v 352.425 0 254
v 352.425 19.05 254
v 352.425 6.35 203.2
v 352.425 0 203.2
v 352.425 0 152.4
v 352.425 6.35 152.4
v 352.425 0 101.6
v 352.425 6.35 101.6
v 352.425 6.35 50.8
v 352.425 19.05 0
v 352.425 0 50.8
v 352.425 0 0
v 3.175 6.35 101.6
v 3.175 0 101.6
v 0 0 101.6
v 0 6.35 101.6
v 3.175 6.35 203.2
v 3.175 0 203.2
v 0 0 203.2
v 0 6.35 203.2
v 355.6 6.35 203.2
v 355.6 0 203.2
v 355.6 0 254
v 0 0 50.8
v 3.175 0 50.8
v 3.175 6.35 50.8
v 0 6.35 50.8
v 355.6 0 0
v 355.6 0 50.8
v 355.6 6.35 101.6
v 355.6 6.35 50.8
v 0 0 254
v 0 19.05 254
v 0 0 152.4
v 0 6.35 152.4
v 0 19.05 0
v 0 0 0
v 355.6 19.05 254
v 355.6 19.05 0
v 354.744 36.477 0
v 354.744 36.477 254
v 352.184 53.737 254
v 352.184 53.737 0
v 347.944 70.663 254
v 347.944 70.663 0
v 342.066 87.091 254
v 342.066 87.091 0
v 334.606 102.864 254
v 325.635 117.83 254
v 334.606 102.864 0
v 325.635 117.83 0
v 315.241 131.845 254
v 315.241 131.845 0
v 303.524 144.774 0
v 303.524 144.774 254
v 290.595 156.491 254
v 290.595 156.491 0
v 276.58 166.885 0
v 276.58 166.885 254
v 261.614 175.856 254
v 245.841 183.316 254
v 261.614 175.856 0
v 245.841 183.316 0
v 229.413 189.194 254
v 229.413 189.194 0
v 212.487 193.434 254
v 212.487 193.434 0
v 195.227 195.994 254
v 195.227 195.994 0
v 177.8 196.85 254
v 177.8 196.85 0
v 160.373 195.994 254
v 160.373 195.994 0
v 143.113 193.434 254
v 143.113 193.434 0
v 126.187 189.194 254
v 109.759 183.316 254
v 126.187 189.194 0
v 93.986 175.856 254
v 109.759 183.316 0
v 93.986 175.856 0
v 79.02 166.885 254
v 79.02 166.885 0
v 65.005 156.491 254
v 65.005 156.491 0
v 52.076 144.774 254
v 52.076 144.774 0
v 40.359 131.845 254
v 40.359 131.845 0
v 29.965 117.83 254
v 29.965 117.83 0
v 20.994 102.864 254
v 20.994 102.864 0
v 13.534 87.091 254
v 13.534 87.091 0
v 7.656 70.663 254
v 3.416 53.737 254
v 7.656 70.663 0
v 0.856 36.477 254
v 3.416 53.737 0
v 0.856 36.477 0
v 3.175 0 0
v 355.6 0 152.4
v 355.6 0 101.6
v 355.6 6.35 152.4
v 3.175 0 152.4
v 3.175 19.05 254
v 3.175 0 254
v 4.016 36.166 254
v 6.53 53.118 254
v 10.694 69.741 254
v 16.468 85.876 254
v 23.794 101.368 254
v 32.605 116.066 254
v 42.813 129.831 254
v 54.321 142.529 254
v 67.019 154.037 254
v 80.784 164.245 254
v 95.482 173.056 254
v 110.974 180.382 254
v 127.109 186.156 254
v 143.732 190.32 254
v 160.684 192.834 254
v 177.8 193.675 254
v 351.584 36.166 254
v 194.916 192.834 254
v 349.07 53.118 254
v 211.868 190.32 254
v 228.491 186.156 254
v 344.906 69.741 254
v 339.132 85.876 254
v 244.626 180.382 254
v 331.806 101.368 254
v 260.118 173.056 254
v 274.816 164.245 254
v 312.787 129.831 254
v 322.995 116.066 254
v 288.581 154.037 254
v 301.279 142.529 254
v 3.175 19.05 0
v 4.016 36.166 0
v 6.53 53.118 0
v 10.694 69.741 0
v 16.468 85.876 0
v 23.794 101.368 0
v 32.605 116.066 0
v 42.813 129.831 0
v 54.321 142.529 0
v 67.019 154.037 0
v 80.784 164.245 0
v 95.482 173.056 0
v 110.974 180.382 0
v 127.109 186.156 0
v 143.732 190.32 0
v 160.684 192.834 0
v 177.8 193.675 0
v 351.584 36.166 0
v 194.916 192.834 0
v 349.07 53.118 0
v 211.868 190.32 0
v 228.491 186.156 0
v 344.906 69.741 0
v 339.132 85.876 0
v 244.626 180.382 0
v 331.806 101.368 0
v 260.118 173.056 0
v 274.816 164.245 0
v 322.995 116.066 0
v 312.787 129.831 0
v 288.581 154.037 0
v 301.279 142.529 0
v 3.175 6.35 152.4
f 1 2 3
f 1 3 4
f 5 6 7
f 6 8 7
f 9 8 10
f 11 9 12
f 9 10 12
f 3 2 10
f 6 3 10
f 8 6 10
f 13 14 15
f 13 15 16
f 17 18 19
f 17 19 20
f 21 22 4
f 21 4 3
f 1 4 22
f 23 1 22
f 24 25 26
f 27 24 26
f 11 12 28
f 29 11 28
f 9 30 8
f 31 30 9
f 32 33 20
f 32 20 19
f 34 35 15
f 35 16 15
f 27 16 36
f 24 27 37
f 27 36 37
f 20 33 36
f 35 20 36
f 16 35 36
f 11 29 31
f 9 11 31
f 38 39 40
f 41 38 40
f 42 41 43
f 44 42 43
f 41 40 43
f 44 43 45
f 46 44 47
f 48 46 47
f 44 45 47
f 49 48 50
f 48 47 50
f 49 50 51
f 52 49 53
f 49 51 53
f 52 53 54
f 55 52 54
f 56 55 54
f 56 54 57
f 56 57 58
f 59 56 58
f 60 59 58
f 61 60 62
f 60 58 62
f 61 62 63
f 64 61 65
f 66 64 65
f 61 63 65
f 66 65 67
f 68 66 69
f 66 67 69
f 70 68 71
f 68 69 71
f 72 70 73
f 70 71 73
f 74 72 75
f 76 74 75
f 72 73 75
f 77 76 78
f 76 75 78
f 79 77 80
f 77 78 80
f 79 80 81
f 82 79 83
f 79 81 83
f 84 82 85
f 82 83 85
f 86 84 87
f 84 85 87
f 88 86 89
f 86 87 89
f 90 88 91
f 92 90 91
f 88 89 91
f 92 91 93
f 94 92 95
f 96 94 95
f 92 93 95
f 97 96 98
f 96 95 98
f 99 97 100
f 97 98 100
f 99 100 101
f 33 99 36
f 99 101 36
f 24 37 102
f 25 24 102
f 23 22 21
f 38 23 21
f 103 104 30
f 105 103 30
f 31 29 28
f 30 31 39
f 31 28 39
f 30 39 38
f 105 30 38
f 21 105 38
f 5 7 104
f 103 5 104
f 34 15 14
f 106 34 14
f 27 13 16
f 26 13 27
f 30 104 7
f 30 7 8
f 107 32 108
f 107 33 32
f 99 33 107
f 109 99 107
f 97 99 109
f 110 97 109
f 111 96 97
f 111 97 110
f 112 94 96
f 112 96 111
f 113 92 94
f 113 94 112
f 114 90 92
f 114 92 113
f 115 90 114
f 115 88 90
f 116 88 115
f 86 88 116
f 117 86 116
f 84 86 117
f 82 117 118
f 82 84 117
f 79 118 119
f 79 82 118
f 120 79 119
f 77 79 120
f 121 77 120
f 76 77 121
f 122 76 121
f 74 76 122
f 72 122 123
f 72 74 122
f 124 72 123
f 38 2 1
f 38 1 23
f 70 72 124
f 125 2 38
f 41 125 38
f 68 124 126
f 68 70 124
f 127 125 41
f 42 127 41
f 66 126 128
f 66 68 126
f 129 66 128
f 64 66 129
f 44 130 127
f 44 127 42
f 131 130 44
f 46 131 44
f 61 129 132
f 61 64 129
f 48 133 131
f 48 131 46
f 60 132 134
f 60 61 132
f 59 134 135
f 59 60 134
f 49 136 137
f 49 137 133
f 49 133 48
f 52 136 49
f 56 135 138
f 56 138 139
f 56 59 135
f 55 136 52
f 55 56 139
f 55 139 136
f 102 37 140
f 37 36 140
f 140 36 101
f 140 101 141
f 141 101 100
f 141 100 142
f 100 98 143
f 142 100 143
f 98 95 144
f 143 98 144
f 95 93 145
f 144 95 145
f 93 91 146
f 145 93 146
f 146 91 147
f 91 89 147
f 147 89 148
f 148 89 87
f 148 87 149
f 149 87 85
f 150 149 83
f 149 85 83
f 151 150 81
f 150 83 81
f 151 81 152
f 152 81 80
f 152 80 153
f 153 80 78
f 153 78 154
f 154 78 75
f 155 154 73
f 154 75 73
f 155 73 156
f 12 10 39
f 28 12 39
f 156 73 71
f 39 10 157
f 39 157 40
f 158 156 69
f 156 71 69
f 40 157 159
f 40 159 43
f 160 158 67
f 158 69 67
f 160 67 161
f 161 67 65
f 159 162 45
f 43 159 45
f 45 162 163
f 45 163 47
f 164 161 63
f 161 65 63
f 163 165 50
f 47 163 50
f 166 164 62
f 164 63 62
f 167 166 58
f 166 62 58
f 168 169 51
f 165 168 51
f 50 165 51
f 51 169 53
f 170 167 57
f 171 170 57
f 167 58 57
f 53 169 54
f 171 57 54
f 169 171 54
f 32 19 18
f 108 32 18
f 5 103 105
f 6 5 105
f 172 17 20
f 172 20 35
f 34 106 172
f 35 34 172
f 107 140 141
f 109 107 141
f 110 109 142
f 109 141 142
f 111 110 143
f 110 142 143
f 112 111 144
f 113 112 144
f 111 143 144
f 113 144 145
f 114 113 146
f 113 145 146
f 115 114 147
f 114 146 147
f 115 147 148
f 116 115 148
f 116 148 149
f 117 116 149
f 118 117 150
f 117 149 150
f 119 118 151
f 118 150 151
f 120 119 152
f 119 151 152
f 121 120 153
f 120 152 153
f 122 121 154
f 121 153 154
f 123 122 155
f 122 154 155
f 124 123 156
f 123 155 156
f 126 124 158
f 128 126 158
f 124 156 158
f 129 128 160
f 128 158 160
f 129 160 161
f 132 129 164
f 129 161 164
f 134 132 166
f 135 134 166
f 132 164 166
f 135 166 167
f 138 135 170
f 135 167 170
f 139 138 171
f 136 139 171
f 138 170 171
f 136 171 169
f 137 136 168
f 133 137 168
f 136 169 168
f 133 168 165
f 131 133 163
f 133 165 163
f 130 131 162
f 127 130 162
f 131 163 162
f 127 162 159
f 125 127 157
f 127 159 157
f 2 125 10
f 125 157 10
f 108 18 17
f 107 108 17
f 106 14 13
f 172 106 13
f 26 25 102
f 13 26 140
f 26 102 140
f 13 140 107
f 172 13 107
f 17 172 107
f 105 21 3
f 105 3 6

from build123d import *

# Parameters (mm, degrees)
BOSS_EXTRUDE1_DEPTH = 254
SKETCH2_W           = 50.8
SKETCH2_H           = 6.35
CUT_EXTRUDE1_DEPTH  = 356.6


with BuildPart() as part:
    # Sketch1 → Boss-Extrude1 (new body)
    with BuildSketch(Plane.XY):
        with BuildLine():
            Line((0, 0), (3.175, 0))
            Line((3.175, 0), (3.175, 19.05))
            ThreePointArc((3.175, 19.05), (177.8, 193.675), (352.425, 19.05))
            Line((352.425, 19.05), (352.425, 0))
            Line((352.425, 0), (355.6, 0))
            Line((355.6, 0), (355.6, 19.05))
            ThreePointArc((355.6, 19.05), (177.8, 196.85), (0, 19.05))
            Line((0, 19.05), (0, 0))
        make_face()
    extrude(amount=BOSS_EXTRUDE1_DEPTH)

    # Sketch2 → Cut-Extrude1 (cut, through all)
    with BuildSketch(Plane(origin=(355.6, 0, 0), x_dir=(0, 0, -1), z_dir=(1, 0, 0))):
        with Locations((-177.8, 3.175)):
            Rectangle(SKETCH2_W, SKETCH2_H)
        with Locations((-76.2, 3.175)):
            Rectangle(SKETCH2_W, SKETCH2_H)
    extrude(amount=-CUT_EXTRUDE1_DEPTH, mode=Mode.SUBTRACT)


solid = part.part
